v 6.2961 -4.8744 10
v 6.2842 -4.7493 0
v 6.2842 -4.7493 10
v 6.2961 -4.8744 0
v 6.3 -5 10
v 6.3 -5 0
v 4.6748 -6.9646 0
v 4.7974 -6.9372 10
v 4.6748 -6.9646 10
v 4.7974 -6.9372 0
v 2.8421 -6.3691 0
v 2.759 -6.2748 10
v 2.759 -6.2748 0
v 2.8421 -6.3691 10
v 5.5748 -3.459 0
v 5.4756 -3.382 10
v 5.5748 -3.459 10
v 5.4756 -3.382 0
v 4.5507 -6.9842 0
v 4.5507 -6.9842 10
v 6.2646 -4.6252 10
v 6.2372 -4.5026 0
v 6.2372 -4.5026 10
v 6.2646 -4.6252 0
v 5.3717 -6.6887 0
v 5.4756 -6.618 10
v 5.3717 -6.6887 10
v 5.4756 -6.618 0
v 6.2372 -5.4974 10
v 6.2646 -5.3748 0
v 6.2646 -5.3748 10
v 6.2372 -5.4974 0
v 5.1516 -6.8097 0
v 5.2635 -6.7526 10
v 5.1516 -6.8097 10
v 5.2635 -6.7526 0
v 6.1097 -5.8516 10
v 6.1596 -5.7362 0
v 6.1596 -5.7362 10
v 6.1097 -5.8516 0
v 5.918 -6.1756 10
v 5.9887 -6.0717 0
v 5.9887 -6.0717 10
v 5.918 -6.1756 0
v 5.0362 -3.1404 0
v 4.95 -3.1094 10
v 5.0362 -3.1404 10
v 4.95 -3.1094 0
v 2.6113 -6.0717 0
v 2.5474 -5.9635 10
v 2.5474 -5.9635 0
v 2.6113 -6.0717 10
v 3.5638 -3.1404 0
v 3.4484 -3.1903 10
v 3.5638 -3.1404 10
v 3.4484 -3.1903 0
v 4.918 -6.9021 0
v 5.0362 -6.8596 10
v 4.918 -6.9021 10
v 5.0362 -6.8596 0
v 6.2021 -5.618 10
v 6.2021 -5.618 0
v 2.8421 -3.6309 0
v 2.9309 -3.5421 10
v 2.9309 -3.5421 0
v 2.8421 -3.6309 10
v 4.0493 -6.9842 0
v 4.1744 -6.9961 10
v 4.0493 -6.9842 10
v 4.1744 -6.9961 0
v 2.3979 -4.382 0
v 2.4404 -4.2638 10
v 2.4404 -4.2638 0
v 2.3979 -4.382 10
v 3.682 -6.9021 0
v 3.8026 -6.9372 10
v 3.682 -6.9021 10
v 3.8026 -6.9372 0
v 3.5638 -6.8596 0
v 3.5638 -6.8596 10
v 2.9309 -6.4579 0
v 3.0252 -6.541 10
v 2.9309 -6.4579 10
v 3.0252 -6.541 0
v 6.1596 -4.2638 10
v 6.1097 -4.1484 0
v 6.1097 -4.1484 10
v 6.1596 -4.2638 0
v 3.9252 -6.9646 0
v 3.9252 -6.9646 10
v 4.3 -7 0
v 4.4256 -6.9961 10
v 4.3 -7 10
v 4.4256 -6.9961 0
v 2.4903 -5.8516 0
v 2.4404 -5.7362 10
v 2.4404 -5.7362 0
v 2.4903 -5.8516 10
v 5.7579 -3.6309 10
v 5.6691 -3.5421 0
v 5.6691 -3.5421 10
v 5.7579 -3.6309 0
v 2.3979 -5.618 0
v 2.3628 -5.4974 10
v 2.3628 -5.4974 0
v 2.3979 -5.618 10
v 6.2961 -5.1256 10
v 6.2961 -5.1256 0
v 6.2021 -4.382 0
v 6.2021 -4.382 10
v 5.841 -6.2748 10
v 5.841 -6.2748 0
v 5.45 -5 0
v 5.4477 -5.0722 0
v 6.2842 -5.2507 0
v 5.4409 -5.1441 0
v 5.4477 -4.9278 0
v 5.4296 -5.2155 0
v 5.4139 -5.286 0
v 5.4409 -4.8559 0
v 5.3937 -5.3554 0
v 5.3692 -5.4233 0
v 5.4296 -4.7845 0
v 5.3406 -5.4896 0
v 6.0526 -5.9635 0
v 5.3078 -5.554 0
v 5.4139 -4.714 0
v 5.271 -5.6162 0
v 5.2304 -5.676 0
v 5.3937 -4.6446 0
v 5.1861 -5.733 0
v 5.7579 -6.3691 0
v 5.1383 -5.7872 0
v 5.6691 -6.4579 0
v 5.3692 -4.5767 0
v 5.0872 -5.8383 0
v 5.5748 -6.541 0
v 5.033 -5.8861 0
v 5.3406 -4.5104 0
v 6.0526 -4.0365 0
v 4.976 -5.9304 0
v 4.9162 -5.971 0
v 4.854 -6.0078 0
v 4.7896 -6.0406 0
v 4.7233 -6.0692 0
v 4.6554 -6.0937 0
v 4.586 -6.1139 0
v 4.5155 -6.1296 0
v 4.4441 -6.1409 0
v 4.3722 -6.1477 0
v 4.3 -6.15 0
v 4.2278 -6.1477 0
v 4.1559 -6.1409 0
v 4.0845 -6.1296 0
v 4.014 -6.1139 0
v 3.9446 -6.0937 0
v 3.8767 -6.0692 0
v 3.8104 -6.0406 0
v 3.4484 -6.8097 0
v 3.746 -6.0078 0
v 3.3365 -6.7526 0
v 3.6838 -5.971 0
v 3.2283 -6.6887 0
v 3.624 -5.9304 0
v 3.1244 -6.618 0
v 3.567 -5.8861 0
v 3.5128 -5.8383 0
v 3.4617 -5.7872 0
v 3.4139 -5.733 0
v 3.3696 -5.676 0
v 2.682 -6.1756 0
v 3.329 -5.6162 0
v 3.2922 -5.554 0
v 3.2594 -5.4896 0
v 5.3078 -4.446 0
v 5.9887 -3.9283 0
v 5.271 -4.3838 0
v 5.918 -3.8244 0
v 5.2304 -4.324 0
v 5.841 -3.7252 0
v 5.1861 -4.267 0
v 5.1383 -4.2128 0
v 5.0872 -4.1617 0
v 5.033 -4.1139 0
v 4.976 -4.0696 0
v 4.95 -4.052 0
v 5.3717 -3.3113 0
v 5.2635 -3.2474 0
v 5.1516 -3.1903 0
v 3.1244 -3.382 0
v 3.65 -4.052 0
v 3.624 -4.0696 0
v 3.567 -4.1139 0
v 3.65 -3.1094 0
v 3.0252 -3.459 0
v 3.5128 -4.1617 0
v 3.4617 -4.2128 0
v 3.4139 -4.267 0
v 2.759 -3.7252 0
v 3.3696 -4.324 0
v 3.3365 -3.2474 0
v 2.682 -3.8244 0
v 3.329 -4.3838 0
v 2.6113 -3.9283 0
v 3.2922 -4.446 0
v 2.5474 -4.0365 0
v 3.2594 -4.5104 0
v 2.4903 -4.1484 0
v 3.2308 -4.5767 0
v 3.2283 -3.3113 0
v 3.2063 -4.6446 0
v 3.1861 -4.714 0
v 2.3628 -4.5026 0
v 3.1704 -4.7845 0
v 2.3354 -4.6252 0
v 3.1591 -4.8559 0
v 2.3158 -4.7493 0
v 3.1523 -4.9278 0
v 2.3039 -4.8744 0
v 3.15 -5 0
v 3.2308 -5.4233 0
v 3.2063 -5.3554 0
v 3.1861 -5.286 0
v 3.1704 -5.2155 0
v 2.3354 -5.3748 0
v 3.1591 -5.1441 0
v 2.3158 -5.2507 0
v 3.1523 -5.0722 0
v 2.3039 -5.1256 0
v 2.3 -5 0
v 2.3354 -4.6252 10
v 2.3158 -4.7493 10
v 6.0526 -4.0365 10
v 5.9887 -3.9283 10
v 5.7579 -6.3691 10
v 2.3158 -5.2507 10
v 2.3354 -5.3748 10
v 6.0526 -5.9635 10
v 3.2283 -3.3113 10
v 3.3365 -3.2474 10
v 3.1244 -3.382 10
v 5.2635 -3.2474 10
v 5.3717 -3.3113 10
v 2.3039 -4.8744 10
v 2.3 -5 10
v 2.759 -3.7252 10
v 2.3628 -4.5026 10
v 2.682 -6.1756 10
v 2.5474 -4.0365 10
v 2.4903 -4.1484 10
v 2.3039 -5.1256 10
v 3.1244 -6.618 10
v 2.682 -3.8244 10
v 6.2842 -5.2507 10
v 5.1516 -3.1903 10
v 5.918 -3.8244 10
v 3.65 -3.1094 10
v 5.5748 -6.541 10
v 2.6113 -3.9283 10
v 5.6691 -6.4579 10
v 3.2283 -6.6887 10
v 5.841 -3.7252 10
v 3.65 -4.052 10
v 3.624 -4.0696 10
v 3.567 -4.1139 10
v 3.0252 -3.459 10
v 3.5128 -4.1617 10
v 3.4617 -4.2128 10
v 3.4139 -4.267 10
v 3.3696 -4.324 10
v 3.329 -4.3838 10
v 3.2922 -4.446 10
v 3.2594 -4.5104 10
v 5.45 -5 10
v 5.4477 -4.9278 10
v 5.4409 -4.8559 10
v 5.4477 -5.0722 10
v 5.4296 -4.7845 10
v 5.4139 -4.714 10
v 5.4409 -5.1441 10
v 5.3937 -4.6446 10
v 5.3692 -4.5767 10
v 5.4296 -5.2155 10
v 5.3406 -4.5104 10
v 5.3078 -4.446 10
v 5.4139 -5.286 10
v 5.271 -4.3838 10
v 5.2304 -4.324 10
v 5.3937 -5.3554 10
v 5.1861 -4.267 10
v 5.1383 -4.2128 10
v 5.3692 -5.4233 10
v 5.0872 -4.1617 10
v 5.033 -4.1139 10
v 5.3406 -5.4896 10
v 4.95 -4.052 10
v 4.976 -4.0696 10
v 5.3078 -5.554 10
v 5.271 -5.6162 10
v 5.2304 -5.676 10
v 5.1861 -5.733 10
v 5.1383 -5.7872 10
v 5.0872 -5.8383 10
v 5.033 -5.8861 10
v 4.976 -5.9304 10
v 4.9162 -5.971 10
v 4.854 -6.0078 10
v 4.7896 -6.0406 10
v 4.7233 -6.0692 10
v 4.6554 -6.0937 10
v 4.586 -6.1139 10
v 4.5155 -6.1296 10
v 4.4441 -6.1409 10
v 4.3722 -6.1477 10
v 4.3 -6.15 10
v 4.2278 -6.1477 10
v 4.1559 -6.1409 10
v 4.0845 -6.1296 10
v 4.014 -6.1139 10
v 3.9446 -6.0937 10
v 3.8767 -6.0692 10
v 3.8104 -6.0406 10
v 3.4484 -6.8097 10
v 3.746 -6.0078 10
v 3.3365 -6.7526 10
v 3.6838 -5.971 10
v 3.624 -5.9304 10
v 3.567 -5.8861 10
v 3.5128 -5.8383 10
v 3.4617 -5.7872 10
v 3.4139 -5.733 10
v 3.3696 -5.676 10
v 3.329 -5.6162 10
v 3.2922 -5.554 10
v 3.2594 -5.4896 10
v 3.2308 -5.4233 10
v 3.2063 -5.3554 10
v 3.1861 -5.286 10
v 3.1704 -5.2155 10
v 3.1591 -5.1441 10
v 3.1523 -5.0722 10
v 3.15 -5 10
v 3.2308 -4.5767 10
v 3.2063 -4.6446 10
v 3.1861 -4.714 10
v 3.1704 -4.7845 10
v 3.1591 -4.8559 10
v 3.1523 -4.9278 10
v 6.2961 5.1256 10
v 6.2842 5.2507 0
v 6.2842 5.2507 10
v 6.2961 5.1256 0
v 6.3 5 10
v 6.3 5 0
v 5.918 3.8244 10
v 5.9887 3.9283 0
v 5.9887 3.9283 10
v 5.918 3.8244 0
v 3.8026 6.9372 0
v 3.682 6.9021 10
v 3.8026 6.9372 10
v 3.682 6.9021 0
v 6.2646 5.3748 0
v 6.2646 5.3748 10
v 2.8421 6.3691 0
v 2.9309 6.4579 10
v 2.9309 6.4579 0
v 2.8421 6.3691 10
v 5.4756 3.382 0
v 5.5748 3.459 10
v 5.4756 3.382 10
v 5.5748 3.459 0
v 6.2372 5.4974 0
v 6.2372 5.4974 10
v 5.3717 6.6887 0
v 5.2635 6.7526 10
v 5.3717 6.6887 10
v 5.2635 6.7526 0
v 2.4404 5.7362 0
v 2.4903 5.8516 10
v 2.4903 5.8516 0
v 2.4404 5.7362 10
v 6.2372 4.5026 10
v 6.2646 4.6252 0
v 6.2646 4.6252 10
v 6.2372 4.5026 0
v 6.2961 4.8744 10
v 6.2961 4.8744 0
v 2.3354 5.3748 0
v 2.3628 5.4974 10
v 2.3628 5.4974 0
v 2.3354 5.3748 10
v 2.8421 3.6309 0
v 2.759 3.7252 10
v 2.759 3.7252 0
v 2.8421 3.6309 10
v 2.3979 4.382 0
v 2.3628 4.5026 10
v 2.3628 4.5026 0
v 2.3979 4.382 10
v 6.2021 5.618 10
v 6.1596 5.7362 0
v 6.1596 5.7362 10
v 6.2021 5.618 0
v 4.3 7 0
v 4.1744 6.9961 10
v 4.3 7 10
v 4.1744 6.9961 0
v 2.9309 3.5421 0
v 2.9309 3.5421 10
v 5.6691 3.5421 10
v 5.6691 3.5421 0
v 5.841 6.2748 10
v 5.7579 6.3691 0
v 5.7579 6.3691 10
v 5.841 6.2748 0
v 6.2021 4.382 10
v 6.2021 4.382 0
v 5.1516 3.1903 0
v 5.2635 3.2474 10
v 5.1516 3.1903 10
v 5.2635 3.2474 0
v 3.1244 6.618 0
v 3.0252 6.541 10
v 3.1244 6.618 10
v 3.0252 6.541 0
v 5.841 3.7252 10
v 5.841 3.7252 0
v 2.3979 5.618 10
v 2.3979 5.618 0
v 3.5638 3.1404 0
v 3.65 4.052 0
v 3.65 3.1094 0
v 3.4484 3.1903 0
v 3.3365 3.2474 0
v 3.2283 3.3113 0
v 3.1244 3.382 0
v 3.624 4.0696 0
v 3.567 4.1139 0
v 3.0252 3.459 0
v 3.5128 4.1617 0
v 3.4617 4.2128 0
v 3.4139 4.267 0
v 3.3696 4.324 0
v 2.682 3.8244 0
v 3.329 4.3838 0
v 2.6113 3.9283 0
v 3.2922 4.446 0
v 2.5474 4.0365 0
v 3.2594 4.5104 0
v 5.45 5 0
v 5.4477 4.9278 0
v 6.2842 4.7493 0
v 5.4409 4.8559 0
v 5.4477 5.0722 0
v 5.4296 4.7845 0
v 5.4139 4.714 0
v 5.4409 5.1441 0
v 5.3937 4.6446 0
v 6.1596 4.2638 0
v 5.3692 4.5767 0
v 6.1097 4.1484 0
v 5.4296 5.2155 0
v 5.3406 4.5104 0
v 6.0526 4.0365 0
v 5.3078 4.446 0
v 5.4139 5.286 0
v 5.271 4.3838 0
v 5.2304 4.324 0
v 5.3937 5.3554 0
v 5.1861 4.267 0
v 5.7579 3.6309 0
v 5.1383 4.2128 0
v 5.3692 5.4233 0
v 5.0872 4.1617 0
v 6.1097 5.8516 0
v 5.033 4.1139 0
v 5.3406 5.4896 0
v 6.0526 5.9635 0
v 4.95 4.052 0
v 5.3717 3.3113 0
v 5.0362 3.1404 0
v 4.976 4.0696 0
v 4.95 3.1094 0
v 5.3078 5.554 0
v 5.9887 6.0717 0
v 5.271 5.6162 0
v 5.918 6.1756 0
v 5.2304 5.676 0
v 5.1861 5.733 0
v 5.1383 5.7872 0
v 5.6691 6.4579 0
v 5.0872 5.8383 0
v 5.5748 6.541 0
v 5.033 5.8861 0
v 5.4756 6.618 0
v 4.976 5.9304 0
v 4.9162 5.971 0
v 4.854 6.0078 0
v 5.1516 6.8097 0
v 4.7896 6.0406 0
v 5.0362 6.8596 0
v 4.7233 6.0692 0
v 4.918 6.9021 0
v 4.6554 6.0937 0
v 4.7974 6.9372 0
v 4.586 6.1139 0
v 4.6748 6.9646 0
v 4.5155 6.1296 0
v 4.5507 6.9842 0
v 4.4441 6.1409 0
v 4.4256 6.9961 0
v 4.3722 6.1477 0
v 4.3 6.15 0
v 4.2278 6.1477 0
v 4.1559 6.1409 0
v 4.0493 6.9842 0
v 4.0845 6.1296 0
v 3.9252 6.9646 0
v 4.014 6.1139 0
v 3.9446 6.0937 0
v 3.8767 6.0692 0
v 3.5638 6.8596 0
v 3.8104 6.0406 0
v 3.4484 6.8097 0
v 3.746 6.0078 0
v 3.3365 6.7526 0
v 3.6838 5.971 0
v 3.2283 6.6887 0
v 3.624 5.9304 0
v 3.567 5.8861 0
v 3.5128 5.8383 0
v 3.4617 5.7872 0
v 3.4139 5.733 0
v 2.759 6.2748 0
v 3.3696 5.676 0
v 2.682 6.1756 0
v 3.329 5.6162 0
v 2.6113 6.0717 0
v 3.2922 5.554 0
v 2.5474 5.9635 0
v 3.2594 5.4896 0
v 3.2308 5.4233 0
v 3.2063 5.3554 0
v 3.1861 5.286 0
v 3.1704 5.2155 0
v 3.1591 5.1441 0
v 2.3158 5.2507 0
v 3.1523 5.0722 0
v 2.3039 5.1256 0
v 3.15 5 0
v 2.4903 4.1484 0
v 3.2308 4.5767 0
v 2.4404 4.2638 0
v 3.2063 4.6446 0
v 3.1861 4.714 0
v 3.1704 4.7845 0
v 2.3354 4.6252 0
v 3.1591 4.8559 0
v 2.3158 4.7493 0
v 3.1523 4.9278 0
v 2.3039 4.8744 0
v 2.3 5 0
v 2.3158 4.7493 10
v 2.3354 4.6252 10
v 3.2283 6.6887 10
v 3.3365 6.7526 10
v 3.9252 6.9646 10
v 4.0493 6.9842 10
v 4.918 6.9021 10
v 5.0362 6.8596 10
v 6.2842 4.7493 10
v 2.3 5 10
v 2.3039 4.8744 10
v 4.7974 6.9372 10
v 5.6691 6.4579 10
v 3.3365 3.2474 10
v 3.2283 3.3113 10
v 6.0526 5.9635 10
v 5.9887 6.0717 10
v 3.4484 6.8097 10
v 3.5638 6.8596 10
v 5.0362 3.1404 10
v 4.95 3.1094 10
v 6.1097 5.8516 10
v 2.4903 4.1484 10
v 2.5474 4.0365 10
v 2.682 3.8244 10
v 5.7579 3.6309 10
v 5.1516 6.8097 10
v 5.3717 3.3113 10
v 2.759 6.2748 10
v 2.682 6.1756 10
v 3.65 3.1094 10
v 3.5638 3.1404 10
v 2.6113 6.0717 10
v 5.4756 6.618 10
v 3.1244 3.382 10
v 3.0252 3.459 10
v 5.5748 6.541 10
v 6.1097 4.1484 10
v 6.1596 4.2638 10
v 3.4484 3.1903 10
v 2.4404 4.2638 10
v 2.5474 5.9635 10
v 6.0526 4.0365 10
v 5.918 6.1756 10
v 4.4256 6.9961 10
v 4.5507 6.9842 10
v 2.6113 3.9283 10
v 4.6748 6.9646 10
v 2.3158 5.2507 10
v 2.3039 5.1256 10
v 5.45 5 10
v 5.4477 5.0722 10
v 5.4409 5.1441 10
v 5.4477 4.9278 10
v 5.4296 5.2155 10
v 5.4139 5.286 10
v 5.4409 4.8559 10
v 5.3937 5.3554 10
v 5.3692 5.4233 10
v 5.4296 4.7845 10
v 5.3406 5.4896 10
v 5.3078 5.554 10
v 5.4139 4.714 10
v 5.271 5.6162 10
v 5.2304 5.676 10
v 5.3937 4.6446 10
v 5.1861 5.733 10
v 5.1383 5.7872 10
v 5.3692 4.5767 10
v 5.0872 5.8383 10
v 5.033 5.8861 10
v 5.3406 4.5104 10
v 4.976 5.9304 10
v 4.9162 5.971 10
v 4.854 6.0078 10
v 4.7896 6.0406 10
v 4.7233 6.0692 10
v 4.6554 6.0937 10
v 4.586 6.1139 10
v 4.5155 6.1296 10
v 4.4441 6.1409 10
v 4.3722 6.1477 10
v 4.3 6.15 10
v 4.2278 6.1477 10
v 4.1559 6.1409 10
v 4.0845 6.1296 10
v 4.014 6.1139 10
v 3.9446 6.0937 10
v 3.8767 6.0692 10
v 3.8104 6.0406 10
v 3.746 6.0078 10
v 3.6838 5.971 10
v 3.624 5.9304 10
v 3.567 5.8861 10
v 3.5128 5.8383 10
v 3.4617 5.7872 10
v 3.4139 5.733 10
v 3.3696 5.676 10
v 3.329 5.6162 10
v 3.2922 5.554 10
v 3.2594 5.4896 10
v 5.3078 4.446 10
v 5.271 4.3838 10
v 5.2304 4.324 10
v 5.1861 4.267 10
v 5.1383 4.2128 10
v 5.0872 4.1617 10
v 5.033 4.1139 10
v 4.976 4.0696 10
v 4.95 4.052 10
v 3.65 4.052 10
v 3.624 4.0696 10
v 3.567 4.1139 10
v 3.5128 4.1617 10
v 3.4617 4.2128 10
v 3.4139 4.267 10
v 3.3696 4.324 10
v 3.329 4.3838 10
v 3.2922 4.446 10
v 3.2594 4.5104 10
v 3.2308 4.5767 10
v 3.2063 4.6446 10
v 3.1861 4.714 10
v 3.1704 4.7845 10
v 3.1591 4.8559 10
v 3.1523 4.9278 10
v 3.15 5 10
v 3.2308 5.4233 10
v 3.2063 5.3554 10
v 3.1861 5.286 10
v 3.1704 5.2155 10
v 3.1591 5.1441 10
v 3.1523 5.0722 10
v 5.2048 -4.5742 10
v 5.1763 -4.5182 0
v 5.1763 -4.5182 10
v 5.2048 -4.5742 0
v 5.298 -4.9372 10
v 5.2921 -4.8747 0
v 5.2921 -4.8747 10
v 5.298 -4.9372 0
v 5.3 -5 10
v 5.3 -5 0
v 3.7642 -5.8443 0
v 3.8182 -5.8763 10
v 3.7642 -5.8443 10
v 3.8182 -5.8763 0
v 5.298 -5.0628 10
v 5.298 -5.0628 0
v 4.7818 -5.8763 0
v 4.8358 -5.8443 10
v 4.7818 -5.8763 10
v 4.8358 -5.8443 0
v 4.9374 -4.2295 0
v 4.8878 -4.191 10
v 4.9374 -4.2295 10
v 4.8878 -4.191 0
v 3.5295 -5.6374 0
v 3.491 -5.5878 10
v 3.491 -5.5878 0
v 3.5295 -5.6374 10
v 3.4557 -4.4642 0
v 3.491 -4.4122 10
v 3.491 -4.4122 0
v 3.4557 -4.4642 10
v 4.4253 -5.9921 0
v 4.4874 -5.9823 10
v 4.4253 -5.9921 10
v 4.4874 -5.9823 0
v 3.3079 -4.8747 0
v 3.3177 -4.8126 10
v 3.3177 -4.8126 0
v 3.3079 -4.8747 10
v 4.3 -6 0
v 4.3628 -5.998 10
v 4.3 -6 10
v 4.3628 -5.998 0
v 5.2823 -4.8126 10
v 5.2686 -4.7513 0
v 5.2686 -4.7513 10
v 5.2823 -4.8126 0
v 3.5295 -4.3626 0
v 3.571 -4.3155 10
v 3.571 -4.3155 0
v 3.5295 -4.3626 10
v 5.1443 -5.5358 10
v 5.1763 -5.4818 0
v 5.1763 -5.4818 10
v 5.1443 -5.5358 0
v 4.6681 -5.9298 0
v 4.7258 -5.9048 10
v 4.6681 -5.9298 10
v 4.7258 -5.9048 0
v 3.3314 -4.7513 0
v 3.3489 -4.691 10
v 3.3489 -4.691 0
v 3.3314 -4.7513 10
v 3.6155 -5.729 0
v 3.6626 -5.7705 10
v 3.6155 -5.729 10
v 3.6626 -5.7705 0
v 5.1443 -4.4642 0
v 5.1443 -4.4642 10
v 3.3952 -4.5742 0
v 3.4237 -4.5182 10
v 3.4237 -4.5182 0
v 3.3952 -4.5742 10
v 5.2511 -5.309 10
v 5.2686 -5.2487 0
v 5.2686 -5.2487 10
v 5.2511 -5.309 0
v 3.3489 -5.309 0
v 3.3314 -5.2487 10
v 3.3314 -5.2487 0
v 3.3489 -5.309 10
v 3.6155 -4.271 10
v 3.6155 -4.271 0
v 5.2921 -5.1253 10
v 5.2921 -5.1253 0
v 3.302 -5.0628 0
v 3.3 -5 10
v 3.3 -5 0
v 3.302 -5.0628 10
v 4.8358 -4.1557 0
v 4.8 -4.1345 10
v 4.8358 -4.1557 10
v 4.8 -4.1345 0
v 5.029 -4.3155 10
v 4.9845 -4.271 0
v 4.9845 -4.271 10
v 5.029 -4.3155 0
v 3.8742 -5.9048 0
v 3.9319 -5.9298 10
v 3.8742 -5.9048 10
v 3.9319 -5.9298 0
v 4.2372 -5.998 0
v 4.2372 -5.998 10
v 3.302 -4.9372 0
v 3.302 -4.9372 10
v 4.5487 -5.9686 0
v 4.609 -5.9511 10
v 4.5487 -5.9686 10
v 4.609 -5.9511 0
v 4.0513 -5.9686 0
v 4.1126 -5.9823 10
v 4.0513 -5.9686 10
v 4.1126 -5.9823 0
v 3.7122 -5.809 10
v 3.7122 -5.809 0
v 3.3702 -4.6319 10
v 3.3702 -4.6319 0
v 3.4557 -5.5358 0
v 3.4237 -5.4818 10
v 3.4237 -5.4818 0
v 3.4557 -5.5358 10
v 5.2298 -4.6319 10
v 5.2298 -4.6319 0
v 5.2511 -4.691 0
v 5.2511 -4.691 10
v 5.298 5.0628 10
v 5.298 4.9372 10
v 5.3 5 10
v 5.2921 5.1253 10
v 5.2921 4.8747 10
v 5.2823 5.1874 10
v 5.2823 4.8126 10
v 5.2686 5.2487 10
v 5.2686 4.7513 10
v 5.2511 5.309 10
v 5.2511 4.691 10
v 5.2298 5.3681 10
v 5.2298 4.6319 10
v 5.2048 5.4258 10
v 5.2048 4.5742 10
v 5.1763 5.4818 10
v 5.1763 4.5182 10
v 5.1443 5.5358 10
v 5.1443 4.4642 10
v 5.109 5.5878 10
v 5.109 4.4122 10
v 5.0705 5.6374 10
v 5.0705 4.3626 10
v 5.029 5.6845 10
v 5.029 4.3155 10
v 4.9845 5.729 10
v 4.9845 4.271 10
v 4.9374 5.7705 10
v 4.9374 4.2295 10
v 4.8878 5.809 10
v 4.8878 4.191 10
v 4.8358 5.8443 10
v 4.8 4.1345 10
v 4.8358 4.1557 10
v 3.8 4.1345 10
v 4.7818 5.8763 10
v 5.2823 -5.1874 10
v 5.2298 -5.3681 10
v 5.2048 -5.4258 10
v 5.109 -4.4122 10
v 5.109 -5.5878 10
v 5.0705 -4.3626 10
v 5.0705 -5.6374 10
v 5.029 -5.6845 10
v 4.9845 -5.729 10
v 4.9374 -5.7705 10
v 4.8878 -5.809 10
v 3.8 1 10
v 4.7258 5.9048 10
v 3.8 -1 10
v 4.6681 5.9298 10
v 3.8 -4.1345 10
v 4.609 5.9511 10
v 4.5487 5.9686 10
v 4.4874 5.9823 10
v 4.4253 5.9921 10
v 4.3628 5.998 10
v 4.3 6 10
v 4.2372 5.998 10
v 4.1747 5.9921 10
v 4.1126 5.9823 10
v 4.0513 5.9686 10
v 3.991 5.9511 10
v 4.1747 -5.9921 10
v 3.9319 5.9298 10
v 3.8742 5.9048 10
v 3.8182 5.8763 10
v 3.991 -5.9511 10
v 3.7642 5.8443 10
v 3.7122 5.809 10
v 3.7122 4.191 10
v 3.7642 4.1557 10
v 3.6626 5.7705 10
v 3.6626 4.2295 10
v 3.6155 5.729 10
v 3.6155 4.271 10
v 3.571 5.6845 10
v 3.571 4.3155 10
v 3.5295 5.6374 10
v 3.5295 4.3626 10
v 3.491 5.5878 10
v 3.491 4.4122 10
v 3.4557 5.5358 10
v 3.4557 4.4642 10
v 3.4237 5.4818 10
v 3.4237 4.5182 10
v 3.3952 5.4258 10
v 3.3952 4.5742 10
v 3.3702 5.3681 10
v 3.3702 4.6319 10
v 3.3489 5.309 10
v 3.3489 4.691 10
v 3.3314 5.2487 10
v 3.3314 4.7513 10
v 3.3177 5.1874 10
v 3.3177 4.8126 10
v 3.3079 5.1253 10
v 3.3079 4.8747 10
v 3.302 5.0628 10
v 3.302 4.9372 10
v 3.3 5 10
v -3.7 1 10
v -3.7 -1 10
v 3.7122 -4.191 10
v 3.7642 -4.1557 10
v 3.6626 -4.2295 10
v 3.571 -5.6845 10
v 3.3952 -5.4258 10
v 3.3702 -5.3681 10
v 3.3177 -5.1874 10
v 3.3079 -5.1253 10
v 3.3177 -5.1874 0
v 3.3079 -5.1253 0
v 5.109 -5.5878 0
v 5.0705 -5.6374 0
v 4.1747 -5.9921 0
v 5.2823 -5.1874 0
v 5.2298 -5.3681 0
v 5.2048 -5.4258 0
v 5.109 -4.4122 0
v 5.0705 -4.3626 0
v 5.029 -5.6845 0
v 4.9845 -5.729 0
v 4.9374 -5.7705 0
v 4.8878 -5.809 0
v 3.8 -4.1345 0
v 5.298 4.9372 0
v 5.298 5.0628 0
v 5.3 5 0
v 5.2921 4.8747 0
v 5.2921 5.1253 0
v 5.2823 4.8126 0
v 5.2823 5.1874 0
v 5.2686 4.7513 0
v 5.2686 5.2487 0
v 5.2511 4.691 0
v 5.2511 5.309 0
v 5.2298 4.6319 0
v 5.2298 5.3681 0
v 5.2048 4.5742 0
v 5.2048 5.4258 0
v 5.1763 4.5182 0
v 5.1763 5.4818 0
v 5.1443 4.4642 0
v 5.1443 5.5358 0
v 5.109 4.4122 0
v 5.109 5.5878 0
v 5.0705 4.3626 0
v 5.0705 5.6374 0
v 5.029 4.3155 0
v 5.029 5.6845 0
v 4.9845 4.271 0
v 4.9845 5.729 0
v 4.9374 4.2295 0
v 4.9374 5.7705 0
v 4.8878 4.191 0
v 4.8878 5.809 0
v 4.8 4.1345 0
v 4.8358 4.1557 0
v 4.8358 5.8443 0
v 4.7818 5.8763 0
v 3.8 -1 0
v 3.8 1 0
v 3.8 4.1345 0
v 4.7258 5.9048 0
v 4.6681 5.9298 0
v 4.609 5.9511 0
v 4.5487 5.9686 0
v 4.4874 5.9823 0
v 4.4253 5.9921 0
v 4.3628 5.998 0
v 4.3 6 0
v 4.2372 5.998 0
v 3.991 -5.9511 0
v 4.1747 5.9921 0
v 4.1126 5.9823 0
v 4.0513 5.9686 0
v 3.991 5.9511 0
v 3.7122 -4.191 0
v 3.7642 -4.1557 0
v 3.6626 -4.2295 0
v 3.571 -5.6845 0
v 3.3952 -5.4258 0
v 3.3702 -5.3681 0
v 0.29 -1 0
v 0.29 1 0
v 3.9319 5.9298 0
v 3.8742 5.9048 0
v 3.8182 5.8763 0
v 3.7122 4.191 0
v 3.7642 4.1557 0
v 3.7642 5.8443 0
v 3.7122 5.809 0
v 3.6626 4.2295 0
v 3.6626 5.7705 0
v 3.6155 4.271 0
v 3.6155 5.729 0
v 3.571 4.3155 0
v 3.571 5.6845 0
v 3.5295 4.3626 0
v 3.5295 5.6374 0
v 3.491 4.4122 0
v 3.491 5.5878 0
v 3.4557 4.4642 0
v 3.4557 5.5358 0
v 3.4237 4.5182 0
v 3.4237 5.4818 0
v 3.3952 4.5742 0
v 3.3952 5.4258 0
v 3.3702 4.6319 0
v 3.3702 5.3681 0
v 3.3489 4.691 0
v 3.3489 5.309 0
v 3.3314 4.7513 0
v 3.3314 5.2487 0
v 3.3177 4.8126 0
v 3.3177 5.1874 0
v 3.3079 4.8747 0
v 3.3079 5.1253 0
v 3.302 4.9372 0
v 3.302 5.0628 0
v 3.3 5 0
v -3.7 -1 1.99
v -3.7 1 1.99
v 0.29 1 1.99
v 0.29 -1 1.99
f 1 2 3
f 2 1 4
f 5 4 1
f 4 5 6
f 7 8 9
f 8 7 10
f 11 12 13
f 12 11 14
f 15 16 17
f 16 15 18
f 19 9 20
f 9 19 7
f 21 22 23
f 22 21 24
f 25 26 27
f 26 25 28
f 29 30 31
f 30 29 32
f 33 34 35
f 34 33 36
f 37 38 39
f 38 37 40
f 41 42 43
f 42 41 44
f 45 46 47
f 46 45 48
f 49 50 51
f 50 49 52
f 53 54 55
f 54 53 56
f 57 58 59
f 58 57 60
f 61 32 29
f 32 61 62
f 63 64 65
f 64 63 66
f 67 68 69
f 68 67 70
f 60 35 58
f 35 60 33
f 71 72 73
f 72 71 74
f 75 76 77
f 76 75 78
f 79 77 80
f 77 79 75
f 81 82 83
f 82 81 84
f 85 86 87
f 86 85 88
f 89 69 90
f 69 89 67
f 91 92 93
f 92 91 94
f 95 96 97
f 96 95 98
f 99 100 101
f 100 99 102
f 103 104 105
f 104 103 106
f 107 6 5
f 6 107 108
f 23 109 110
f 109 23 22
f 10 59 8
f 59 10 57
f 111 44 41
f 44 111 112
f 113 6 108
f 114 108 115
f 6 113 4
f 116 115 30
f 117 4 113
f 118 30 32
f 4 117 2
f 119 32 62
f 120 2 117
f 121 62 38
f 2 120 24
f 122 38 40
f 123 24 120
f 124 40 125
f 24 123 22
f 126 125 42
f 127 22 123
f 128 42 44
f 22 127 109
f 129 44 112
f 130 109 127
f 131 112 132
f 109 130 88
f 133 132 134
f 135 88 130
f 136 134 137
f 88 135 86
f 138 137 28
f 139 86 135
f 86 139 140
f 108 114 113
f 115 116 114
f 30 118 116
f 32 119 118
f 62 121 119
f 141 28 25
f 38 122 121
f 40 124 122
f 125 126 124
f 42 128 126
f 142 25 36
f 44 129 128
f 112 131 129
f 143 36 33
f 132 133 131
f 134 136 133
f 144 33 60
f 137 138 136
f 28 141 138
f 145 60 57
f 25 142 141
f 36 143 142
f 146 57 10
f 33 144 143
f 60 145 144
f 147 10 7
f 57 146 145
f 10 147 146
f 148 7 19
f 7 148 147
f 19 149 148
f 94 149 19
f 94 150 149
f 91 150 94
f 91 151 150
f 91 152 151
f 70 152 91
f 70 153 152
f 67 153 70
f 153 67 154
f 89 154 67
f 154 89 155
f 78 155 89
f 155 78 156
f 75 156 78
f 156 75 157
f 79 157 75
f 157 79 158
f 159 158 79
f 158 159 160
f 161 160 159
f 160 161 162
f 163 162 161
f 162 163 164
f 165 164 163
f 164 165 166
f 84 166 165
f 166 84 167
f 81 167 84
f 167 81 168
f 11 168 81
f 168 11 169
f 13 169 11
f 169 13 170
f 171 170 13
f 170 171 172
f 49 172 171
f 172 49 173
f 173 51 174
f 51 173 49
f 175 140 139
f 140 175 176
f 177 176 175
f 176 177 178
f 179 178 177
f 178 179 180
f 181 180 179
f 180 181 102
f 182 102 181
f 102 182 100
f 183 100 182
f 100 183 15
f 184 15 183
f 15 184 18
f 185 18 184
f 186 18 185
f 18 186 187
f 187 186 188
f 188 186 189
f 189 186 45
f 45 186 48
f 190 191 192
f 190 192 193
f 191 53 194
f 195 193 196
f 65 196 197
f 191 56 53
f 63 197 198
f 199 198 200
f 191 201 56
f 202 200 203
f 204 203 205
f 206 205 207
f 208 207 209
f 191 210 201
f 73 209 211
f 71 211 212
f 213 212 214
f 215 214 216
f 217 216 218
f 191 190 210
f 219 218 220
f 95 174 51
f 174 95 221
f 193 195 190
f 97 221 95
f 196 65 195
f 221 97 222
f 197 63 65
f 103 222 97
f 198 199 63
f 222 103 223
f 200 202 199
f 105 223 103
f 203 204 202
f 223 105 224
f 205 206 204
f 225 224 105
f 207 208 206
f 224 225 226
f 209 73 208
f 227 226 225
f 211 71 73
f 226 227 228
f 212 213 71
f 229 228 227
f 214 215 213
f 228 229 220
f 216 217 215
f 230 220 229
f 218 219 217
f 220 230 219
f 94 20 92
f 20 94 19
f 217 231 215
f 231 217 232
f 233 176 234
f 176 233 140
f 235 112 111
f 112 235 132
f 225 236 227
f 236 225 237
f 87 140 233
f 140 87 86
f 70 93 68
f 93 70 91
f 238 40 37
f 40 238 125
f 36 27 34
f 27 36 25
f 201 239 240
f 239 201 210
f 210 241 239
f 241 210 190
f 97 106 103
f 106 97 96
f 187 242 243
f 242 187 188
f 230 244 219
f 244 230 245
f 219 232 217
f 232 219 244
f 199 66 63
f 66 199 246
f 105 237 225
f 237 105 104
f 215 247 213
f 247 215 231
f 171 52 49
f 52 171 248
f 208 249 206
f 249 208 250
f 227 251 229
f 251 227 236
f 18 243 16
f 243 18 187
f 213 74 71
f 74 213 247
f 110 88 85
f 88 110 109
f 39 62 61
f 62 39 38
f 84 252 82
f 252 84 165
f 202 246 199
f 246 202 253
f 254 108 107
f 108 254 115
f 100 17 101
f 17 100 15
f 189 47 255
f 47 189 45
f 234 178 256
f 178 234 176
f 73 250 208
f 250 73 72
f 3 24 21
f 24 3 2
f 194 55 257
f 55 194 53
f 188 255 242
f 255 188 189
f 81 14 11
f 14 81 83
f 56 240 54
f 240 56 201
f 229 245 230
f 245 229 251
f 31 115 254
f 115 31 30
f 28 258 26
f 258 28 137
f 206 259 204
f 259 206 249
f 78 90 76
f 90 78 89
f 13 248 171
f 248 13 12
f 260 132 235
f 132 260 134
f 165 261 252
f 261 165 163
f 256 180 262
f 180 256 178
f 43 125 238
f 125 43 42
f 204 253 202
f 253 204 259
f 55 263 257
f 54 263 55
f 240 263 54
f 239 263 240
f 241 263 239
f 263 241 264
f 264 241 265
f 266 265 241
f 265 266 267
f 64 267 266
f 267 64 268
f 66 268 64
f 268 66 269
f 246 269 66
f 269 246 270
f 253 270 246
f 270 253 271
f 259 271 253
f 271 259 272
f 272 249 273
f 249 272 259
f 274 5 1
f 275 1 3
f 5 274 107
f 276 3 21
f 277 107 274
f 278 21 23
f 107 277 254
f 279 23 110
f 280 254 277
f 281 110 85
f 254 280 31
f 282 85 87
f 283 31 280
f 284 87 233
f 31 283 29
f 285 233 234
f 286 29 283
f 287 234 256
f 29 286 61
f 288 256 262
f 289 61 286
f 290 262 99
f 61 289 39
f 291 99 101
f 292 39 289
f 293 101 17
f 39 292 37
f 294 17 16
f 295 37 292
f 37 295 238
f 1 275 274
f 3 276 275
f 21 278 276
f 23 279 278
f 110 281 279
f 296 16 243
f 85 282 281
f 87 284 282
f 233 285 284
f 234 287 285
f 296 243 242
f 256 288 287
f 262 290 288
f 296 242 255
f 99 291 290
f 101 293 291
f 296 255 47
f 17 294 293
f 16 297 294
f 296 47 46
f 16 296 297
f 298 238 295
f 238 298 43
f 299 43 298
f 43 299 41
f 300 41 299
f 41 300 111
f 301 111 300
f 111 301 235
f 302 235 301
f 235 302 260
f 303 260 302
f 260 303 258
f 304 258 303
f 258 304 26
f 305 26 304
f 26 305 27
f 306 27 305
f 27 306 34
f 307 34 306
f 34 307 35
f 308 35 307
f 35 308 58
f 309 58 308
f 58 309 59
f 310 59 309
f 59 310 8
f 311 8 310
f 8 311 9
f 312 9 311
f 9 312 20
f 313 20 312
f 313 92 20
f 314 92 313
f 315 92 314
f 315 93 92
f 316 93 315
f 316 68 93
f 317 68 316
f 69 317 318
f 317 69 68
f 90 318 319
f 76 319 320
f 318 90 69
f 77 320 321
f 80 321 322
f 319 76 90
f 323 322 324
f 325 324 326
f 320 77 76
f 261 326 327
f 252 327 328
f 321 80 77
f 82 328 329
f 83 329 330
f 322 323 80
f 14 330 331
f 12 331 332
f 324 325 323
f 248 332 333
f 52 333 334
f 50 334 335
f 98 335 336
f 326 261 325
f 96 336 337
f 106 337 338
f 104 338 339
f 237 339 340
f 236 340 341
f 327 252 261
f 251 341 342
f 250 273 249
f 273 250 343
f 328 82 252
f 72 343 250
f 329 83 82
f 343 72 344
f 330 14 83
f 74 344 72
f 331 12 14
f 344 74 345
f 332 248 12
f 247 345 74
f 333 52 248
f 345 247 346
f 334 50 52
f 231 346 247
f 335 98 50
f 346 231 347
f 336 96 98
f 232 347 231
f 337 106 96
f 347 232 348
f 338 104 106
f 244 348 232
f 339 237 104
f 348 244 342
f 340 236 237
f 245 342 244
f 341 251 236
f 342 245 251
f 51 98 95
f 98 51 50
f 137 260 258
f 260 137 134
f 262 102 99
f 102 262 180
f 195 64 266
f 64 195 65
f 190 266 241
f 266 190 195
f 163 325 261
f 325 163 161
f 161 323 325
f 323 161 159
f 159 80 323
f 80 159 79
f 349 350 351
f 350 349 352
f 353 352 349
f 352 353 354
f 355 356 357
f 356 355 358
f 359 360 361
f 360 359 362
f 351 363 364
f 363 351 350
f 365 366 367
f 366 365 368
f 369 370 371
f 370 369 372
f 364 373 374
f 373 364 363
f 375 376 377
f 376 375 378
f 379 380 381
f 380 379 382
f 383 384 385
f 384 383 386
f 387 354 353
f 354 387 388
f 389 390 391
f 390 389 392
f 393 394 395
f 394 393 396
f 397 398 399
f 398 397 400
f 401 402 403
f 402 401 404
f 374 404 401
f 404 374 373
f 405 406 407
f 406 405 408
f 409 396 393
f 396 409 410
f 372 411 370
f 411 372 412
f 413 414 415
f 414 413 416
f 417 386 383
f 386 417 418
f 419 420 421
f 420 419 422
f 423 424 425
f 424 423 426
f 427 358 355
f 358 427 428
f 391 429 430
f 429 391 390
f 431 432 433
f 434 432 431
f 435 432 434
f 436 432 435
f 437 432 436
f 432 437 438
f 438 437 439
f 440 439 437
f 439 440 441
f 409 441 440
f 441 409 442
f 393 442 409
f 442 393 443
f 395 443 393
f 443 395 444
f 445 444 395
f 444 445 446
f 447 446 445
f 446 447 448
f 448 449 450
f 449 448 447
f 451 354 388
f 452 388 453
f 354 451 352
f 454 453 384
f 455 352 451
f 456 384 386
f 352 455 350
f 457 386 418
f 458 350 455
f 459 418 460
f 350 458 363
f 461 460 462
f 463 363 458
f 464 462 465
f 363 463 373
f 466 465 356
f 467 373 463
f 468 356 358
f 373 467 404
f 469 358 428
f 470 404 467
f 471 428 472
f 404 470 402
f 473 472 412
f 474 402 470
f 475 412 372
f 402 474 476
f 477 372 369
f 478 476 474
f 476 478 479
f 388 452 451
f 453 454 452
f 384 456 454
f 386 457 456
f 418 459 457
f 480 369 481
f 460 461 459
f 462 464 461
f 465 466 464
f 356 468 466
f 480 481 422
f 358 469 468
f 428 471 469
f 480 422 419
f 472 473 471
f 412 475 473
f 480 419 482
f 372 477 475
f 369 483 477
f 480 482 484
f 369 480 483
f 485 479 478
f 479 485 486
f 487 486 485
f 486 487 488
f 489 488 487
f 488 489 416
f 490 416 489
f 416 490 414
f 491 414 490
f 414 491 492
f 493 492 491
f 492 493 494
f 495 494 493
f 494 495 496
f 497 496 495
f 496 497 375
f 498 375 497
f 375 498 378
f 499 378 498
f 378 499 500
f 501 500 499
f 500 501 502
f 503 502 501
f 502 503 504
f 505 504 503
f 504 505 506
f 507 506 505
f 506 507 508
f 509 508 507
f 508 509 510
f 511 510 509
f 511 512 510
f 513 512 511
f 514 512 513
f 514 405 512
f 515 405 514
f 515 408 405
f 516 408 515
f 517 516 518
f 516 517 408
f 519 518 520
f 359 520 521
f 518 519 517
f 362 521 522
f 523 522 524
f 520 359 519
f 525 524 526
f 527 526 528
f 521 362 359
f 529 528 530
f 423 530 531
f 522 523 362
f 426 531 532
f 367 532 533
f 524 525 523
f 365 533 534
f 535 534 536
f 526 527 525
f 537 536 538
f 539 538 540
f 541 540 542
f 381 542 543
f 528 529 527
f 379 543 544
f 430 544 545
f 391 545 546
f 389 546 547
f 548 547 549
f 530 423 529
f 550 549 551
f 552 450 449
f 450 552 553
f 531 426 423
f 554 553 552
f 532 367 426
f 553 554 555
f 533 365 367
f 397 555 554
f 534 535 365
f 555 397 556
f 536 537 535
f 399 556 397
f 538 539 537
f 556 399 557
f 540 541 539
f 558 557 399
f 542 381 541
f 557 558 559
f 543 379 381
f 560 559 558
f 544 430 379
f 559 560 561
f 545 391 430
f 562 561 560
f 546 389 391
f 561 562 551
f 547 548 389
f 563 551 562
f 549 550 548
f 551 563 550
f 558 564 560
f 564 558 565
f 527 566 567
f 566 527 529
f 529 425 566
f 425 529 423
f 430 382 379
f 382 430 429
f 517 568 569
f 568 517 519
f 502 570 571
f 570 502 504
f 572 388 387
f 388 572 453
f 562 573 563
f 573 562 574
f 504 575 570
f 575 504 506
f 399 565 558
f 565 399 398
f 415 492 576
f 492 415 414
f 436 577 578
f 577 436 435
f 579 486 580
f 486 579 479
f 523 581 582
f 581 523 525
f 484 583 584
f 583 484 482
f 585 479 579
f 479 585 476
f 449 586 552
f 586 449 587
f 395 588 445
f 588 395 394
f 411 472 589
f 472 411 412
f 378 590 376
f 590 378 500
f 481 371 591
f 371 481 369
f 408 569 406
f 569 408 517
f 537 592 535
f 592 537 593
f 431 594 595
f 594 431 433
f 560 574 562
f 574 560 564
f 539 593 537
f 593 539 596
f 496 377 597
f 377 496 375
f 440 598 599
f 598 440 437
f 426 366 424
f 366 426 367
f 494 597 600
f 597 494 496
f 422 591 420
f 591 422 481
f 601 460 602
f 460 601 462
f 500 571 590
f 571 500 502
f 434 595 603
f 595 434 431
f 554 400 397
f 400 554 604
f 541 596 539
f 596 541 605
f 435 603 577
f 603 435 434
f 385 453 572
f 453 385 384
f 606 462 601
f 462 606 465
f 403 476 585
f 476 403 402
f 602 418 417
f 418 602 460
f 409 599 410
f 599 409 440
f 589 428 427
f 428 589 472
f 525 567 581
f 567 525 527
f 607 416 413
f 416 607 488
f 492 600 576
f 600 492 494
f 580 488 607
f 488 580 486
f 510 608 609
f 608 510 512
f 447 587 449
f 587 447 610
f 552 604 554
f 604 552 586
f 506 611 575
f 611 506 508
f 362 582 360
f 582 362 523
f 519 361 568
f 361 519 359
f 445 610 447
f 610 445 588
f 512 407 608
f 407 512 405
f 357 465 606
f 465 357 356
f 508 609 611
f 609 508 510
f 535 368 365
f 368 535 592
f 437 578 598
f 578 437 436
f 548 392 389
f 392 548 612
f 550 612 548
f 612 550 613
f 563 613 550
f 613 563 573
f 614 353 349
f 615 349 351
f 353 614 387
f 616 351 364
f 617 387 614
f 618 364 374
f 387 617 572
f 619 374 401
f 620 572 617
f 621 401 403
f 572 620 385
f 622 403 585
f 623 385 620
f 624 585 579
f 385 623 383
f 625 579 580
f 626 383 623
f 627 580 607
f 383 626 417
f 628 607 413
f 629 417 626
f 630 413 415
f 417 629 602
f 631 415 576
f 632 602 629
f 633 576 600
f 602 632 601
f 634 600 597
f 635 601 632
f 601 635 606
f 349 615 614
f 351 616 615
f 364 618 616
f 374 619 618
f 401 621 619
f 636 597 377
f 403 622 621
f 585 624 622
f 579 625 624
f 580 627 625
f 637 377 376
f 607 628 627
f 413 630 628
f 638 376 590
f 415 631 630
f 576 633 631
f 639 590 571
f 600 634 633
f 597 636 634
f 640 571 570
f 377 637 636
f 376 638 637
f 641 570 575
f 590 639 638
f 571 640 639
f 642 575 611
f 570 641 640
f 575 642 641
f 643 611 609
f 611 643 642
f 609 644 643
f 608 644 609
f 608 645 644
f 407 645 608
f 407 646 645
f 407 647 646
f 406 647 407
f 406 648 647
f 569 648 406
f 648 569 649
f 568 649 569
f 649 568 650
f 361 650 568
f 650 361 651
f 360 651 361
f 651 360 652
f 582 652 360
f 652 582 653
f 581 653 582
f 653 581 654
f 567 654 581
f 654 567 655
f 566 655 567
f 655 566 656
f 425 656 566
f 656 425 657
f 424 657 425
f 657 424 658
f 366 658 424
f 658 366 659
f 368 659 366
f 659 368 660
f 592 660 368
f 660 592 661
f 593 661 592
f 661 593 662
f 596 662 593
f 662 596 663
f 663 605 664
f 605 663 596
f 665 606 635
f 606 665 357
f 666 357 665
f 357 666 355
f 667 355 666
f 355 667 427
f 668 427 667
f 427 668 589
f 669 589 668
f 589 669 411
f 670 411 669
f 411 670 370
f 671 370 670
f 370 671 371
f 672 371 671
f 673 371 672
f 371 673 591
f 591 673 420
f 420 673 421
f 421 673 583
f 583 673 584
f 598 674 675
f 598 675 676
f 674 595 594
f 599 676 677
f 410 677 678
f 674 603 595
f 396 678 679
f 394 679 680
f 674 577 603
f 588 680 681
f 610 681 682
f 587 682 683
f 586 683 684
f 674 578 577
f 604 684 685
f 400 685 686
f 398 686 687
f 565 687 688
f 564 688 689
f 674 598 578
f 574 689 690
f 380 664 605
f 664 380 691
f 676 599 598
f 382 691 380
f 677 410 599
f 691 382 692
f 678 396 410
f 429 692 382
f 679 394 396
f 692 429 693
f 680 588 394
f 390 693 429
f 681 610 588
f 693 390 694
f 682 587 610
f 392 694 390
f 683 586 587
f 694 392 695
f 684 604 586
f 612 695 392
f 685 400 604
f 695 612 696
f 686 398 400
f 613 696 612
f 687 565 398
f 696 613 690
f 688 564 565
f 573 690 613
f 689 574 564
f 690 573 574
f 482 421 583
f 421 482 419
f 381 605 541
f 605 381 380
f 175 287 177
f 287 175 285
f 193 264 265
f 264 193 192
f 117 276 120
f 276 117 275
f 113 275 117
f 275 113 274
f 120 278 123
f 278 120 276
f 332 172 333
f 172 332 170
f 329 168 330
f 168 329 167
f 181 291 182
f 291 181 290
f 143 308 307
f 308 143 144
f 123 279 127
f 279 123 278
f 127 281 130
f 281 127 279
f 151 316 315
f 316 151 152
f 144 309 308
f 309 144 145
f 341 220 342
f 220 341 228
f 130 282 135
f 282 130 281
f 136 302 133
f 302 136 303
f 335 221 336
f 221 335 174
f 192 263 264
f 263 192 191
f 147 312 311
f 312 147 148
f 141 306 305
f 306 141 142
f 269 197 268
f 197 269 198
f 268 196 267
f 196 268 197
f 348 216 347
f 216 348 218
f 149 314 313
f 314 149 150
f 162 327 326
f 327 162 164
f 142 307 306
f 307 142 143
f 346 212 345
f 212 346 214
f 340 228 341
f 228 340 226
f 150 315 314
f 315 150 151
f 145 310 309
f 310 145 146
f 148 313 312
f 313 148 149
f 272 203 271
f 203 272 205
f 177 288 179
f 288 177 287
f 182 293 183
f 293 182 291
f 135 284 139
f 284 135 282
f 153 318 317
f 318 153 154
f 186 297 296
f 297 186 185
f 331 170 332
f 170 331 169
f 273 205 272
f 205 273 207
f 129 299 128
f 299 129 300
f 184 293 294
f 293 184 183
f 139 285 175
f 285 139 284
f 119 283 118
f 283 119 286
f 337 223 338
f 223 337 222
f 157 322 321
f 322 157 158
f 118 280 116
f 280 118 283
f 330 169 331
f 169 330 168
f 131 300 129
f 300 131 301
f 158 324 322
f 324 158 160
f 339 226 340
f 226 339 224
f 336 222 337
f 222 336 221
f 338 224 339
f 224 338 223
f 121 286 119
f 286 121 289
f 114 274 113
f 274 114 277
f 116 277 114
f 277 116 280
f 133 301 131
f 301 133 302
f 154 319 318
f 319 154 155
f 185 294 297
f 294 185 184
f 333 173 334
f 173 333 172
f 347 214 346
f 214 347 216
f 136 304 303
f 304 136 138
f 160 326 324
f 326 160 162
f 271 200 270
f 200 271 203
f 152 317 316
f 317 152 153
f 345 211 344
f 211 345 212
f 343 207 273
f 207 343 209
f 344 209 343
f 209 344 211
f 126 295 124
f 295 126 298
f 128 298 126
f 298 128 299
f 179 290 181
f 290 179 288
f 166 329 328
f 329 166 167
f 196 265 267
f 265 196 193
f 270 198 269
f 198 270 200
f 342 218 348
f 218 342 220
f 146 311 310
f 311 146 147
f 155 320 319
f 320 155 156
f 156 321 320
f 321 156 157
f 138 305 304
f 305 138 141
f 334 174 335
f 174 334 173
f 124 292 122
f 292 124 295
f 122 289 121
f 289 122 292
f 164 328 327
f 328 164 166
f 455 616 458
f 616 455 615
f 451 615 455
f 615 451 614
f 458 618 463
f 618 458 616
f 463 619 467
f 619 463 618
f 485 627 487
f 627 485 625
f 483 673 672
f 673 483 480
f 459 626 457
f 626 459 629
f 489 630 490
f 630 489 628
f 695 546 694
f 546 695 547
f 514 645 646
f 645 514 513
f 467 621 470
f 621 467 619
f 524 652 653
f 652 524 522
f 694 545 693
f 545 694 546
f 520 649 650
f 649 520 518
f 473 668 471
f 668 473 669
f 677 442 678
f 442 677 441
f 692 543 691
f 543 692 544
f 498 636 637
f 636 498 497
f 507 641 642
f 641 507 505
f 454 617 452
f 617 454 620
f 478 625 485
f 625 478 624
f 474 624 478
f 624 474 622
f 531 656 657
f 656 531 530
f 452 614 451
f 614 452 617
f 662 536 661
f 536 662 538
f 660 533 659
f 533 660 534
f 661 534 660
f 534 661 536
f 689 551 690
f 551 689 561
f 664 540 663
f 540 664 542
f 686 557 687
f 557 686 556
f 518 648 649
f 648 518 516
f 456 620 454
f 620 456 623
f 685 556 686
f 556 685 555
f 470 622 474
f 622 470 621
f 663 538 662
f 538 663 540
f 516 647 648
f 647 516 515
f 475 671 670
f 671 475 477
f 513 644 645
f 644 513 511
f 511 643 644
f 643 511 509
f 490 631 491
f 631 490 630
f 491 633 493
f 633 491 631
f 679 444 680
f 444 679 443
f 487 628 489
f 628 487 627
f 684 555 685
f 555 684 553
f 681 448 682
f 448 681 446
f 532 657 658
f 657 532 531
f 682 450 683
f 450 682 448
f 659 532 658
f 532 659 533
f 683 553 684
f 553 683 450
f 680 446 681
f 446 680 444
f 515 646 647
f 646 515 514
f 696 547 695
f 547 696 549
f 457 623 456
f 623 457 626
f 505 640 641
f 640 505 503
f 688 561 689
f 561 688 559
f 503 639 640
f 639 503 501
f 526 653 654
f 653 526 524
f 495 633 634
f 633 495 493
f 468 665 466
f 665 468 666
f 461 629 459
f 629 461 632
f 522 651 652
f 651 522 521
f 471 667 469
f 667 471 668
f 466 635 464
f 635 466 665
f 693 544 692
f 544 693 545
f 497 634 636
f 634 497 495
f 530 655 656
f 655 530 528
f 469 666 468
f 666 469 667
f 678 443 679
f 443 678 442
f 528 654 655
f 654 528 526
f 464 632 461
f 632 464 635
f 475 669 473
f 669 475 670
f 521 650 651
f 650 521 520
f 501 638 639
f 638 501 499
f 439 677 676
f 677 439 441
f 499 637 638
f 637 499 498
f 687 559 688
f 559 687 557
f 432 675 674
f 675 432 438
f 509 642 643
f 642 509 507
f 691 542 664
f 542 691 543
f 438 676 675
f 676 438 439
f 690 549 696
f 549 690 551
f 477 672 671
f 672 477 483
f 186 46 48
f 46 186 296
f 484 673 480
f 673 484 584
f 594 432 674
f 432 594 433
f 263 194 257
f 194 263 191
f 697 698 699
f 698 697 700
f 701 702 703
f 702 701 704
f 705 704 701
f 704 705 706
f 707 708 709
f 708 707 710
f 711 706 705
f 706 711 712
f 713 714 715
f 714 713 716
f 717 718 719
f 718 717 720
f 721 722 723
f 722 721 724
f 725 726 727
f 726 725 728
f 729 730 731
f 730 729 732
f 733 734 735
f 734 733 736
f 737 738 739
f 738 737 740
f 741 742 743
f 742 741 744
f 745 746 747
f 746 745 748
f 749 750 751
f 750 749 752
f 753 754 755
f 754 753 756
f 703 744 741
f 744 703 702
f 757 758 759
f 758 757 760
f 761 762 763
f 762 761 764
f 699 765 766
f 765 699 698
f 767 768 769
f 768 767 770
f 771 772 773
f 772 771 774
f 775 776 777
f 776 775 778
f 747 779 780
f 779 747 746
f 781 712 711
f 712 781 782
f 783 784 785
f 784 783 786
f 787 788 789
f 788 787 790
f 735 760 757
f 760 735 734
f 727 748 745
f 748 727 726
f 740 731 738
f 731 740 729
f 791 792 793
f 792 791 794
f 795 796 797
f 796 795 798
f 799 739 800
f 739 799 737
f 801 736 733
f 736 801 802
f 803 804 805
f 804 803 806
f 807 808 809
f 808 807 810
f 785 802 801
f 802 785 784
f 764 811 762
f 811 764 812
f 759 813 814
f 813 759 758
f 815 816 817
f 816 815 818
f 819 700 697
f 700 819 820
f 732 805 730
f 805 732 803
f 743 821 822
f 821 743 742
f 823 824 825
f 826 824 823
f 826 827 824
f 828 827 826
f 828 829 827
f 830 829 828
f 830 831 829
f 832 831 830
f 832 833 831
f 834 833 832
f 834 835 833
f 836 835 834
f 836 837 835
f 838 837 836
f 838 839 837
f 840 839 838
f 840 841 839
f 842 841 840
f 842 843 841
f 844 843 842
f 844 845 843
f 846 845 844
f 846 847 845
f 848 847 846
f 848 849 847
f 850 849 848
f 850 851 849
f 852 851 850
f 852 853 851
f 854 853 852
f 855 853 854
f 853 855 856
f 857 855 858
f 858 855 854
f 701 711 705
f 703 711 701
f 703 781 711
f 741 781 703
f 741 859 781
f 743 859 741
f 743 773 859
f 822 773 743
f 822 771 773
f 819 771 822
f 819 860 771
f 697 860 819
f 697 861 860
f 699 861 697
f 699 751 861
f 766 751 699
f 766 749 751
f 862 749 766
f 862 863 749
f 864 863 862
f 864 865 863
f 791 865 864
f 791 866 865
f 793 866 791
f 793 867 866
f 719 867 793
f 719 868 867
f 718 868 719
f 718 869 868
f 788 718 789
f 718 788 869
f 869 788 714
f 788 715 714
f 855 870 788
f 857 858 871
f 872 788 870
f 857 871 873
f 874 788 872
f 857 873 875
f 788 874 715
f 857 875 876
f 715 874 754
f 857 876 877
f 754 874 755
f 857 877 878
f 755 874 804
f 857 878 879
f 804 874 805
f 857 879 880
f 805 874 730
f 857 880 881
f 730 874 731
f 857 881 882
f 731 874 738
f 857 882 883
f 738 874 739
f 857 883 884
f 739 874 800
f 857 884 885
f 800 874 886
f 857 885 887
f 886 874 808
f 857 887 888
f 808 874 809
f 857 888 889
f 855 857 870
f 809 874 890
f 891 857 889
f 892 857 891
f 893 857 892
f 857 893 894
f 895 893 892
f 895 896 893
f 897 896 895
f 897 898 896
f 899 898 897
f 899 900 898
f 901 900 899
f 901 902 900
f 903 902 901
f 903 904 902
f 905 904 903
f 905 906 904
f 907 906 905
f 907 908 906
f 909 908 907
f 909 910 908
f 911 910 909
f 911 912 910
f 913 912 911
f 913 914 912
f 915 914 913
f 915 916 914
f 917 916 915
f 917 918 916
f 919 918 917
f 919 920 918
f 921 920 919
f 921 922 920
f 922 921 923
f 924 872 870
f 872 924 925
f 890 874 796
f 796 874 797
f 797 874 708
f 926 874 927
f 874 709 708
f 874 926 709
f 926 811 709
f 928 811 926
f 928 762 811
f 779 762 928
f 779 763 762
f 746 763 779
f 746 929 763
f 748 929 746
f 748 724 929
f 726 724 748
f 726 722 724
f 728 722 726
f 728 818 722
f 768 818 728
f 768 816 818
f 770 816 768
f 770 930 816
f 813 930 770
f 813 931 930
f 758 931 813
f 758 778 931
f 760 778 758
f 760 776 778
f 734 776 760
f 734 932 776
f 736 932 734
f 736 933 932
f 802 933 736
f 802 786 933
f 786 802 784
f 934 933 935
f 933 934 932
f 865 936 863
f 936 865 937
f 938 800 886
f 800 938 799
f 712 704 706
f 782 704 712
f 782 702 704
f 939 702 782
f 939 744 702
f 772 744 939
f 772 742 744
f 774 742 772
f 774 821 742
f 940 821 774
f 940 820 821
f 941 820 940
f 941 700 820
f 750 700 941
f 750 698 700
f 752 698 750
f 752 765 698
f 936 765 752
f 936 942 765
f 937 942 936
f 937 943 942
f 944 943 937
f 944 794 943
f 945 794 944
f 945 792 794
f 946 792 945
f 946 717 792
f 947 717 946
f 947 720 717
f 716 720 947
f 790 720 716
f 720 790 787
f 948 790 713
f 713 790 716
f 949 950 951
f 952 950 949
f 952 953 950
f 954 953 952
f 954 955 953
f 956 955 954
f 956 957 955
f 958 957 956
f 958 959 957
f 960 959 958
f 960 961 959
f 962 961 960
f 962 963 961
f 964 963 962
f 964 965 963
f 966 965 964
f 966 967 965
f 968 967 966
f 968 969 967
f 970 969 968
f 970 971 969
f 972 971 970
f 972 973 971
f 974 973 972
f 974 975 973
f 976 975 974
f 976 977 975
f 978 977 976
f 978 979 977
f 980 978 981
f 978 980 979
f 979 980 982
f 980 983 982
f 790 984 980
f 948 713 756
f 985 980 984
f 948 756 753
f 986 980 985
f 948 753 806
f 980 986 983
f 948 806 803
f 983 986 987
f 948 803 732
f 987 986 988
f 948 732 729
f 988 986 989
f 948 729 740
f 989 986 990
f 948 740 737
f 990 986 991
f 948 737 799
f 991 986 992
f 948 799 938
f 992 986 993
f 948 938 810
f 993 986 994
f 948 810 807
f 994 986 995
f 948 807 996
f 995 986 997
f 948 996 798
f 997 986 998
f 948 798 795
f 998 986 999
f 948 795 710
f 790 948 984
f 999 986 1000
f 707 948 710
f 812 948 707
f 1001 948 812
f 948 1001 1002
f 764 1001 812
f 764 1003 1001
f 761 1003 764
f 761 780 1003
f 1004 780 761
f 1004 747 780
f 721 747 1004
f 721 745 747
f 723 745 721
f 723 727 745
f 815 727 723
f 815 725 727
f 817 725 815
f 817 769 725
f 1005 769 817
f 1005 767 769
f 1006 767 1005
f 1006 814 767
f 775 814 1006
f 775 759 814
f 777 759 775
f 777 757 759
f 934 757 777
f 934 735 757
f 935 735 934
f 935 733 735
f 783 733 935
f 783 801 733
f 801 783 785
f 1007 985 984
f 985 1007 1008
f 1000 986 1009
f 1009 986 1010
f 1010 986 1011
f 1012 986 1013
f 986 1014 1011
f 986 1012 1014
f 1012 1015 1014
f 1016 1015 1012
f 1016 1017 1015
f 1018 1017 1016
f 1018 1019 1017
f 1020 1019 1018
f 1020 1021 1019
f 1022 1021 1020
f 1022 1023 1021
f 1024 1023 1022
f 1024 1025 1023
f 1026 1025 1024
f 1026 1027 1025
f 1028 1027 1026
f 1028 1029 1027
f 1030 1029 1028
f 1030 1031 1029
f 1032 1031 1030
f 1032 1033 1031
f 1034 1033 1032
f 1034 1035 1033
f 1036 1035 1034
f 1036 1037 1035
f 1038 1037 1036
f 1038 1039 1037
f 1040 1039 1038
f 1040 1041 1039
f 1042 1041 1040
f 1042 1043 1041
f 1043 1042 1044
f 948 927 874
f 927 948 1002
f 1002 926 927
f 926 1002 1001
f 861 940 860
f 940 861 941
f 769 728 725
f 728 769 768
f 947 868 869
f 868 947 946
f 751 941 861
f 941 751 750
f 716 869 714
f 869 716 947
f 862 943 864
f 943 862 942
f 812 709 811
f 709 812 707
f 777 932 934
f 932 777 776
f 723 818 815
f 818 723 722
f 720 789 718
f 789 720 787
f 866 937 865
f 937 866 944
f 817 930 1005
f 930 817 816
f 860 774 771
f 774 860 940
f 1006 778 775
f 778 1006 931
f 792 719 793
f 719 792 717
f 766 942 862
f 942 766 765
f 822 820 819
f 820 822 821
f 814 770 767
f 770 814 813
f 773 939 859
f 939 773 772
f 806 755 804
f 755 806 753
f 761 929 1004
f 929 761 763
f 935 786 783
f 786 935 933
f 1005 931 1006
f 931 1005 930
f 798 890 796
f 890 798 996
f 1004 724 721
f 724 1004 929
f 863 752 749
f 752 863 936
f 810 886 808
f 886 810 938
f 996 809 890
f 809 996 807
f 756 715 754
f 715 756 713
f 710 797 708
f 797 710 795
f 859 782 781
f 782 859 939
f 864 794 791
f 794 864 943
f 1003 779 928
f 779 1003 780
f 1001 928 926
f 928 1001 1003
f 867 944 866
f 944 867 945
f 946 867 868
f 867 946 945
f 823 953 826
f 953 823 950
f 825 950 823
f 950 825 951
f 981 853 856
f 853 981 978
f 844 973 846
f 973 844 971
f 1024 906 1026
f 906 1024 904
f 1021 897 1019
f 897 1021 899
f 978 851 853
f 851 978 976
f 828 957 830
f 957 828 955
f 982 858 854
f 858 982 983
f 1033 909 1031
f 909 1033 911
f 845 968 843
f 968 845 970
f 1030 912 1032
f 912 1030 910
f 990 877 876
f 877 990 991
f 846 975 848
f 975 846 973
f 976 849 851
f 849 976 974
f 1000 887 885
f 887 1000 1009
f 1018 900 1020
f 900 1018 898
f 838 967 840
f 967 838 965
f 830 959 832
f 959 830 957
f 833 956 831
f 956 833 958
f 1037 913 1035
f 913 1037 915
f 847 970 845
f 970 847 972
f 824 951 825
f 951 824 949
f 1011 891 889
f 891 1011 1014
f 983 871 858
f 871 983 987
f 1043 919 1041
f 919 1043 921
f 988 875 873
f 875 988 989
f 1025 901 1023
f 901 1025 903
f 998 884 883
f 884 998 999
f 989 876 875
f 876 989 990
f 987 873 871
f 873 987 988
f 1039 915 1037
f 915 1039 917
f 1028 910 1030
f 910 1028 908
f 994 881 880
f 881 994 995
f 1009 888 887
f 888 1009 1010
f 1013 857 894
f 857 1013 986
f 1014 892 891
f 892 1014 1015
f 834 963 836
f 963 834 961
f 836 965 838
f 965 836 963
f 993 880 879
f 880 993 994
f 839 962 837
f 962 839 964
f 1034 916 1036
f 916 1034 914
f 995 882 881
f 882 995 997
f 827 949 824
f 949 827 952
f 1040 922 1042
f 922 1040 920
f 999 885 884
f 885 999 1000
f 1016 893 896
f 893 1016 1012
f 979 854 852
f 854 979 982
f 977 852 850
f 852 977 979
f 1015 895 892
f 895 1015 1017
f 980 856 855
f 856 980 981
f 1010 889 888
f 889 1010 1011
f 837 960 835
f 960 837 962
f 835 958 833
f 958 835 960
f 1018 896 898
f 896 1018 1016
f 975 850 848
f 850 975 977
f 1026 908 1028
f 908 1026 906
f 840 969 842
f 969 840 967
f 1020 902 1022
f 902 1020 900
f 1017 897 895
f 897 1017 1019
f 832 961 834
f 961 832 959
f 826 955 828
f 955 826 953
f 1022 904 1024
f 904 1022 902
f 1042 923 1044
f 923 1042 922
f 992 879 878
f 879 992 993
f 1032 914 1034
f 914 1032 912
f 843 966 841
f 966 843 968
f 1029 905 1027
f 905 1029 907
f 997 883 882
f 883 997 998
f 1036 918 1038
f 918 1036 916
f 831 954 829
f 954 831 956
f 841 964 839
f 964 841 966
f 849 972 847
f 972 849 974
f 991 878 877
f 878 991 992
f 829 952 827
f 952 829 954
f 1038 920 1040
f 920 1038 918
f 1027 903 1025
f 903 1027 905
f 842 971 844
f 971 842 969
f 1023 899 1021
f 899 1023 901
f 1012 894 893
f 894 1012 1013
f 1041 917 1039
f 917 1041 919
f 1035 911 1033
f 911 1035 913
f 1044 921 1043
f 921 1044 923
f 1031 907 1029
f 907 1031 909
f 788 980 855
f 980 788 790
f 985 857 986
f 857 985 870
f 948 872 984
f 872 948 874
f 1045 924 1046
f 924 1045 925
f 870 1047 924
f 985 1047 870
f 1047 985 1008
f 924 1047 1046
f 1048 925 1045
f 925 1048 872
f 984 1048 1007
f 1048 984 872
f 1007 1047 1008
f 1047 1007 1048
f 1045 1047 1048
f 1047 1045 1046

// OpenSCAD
module mob(d,h,t,cl)
{
    tt = 0.5*t+cl;

    translate([t,0,0])
    difference()
    {
        translate([t,0,0])
        union()
        {
            for (f=[-1,1])
            {
                translate([0,f*d/2,0])
                cylinder(h,(t+cl)/2,(t+cl)/2);
            }
            translate([-tt/2,-d/2,0])
            cube([tt,d,h]);

            translate([-4*t,-t/2,0])
            cube([4*t,t,h]);
        }

        dd = d+2*t+2*$fs;
        translate([-3*t-$fs,-dd/2,-$fs])
        cube([2*t,dd,t]);
    }
}

module fix(d,h,t, cl)
{
    translate([cl,0,0])
    difference()
    {
        translate([2*t,0,0])
        for (f=[-1,1])
        {
            translate([0,f*d/2,0])
            cylinder(h,t,t);
        }

        translate([0,0,-$fs])
        mob(d,h+2*$fs,t,cl);
    }
}

$fn = 100;
$fs = 0.01;

d = 10;
h = 10;
t = 2;
cl = 0.3;

fix(d,h,t,cl);
    /* translate([15,0,0]) */
translate([cl,0,0])
    mob(d,h,t, 0);
